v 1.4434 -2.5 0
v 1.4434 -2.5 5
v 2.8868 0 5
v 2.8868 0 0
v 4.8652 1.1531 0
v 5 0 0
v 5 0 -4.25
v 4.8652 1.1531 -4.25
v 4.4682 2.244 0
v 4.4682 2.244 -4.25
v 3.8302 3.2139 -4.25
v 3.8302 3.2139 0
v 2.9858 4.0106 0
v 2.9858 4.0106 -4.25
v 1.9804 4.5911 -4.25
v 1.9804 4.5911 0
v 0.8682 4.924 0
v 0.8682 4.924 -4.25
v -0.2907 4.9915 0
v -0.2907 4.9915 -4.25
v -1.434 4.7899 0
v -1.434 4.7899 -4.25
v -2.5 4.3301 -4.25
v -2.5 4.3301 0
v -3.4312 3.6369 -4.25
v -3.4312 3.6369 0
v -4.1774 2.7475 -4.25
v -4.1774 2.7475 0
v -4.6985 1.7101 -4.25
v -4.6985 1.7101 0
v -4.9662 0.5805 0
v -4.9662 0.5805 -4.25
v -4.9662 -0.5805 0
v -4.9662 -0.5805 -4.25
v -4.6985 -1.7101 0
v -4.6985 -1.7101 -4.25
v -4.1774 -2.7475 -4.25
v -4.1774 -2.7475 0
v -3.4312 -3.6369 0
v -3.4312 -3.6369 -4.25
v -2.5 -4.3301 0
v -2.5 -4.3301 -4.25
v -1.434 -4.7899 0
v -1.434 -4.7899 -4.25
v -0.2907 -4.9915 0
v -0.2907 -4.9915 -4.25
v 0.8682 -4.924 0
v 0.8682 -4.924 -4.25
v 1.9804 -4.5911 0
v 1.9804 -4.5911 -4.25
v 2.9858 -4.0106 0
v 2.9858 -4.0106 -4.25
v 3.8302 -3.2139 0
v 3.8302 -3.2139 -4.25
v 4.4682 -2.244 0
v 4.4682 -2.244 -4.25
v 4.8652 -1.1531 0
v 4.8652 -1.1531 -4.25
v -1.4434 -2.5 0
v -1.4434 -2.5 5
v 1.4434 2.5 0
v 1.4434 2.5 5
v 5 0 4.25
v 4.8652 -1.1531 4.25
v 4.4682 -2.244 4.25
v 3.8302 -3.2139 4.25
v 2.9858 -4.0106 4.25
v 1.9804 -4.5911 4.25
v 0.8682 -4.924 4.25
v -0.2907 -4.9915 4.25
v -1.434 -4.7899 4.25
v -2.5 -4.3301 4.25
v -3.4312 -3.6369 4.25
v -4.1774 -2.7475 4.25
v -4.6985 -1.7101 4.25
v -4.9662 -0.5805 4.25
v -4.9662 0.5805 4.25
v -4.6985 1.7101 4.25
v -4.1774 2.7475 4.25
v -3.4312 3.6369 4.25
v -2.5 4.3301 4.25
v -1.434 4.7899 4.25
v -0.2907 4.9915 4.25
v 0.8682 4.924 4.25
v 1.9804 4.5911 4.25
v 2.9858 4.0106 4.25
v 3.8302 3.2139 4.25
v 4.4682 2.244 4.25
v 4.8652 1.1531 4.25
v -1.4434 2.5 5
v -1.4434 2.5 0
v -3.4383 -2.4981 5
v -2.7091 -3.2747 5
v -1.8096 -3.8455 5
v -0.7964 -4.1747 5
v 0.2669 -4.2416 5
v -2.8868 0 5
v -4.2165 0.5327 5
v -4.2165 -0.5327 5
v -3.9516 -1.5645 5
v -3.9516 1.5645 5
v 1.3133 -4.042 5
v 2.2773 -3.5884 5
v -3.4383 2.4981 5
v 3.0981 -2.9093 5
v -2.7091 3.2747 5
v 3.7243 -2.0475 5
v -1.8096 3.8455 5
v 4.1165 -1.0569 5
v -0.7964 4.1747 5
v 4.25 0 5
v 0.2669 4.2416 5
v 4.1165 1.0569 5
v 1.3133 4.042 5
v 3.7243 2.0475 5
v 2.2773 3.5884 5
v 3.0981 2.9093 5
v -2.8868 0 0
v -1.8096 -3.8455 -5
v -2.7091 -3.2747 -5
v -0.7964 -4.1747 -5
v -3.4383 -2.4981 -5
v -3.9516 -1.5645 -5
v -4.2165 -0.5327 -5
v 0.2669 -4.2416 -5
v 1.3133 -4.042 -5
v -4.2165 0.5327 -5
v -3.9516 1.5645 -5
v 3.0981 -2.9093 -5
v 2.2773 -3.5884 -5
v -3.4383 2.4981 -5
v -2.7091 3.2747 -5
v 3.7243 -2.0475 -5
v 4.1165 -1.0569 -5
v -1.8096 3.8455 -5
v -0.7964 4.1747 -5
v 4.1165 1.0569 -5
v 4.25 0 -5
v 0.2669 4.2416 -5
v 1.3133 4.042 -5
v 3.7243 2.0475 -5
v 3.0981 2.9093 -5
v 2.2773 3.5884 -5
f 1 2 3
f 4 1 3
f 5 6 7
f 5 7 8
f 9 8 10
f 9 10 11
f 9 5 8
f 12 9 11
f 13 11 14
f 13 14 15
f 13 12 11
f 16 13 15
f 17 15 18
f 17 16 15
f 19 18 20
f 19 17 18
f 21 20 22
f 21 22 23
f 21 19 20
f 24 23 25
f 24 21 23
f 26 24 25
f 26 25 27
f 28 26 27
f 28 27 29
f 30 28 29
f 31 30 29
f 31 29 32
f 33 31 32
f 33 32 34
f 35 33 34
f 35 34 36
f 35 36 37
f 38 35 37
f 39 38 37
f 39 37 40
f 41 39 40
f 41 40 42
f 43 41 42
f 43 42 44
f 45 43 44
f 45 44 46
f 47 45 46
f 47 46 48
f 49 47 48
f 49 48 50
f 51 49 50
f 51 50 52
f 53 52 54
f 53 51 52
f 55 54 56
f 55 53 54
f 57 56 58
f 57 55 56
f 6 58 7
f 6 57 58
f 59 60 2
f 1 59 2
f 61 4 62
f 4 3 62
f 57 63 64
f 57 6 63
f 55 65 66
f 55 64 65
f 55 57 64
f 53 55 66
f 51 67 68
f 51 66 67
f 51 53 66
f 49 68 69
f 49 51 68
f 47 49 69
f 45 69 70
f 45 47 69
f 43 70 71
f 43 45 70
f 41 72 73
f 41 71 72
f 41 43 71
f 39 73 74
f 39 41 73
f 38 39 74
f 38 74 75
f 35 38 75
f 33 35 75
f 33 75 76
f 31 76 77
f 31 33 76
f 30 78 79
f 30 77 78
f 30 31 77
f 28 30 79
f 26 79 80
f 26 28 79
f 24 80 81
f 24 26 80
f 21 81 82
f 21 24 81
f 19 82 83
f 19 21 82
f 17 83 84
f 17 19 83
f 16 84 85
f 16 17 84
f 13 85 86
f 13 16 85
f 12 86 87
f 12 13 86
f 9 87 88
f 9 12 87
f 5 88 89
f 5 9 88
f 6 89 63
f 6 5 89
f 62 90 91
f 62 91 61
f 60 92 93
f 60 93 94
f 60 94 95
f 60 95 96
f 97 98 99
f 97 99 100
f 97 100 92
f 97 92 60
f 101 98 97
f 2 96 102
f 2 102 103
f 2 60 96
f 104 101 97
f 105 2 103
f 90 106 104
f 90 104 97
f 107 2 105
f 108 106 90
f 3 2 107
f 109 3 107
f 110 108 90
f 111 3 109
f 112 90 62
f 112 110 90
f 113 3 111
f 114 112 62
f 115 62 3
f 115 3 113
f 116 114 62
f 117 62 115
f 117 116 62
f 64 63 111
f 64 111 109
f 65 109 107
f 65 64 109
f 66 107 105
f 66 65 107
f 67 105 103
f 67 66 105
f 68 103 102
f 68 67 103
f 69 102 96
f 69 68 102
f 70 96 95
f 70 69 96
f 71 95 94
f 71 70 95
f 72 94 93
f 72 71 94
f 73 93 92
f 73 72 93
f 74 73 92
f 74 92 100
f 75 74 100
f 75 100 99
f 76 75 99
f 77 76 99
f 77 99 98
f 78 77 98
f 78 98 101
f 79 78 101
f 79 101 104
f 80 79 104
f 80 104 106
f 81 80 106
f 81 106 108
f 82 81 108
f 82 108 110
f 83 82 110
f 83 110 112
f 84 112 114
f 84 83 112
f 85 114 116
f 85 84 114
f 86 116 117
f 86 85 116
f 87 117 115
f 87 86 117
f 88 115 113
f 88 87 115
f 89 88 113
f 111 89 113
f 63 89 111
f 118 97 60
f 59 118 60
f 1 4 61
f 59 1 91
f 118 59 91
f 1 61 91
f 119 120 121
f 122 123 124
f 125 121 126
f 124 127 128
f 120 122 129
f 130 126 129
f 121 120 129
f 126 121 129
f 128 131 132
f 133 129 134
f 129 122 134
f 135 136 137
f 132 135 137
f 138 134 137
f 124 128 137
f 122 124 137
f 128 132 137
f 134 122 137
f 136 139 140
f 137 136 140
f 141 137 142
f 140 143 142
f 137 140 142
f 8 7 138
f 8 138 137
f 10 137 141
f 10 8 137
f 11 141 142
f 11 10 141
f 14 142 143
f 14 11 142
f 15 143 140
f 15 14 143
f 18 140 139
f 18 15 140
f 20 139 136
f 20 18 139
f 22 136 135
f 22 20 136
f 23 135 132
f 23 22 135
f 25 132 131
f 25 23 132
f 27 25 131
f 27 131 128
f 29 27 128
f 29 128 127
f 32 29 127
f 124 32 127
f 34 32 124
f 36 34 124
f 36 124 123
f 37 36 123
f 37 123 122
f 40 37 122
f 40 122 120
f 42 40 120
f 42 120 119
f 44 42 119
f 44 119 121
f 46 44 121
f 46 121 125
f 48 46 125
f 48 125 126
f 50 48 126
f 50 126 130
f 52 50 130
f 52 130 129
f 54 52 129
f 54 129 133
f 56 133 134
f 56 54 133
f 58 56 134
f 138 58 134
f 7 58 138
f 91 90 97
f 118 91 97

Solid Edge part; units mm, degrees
sketch "Sketch1" plane through (0, 0, 0) normal (0, 0, 1) x (1, 0, 0)
  circle A0 centre (0, 0) radius 5
  dimension "D1" = 10
extrude "Protrusion1" add sketch "Sketch1" along normal mid plane 10
chamfer "Chamfer1" distance 0.75 angle 45 2 edges at (-5, 0, -5) (-5, 0, 5)
sketch "Sketch2" plane through (0, 0, 5) normal (0, 0, 1) x (1, 0, 0)
  line L0 (-1.4434, 2.5) -> (1.4434, 2.5)
  line L1 (2.8868, 0) -> (1.4434, 2.5)
  line L2 (1.4434, -2.5) -> (2.8868, 0)
  line L3 (-1.4434, -2.5) -> (1.4434, -2.5)
  line L4 (-2.8868, 0) -> (-1.4434, -2.5)
  line L5 (-1.4434, 2.5) -> (-2.8868, 0)
  dimension "D1" = 5
extrude "Cutout1" cut sketch "Sketch2" against normal blind 5
properties part number "24104460"
